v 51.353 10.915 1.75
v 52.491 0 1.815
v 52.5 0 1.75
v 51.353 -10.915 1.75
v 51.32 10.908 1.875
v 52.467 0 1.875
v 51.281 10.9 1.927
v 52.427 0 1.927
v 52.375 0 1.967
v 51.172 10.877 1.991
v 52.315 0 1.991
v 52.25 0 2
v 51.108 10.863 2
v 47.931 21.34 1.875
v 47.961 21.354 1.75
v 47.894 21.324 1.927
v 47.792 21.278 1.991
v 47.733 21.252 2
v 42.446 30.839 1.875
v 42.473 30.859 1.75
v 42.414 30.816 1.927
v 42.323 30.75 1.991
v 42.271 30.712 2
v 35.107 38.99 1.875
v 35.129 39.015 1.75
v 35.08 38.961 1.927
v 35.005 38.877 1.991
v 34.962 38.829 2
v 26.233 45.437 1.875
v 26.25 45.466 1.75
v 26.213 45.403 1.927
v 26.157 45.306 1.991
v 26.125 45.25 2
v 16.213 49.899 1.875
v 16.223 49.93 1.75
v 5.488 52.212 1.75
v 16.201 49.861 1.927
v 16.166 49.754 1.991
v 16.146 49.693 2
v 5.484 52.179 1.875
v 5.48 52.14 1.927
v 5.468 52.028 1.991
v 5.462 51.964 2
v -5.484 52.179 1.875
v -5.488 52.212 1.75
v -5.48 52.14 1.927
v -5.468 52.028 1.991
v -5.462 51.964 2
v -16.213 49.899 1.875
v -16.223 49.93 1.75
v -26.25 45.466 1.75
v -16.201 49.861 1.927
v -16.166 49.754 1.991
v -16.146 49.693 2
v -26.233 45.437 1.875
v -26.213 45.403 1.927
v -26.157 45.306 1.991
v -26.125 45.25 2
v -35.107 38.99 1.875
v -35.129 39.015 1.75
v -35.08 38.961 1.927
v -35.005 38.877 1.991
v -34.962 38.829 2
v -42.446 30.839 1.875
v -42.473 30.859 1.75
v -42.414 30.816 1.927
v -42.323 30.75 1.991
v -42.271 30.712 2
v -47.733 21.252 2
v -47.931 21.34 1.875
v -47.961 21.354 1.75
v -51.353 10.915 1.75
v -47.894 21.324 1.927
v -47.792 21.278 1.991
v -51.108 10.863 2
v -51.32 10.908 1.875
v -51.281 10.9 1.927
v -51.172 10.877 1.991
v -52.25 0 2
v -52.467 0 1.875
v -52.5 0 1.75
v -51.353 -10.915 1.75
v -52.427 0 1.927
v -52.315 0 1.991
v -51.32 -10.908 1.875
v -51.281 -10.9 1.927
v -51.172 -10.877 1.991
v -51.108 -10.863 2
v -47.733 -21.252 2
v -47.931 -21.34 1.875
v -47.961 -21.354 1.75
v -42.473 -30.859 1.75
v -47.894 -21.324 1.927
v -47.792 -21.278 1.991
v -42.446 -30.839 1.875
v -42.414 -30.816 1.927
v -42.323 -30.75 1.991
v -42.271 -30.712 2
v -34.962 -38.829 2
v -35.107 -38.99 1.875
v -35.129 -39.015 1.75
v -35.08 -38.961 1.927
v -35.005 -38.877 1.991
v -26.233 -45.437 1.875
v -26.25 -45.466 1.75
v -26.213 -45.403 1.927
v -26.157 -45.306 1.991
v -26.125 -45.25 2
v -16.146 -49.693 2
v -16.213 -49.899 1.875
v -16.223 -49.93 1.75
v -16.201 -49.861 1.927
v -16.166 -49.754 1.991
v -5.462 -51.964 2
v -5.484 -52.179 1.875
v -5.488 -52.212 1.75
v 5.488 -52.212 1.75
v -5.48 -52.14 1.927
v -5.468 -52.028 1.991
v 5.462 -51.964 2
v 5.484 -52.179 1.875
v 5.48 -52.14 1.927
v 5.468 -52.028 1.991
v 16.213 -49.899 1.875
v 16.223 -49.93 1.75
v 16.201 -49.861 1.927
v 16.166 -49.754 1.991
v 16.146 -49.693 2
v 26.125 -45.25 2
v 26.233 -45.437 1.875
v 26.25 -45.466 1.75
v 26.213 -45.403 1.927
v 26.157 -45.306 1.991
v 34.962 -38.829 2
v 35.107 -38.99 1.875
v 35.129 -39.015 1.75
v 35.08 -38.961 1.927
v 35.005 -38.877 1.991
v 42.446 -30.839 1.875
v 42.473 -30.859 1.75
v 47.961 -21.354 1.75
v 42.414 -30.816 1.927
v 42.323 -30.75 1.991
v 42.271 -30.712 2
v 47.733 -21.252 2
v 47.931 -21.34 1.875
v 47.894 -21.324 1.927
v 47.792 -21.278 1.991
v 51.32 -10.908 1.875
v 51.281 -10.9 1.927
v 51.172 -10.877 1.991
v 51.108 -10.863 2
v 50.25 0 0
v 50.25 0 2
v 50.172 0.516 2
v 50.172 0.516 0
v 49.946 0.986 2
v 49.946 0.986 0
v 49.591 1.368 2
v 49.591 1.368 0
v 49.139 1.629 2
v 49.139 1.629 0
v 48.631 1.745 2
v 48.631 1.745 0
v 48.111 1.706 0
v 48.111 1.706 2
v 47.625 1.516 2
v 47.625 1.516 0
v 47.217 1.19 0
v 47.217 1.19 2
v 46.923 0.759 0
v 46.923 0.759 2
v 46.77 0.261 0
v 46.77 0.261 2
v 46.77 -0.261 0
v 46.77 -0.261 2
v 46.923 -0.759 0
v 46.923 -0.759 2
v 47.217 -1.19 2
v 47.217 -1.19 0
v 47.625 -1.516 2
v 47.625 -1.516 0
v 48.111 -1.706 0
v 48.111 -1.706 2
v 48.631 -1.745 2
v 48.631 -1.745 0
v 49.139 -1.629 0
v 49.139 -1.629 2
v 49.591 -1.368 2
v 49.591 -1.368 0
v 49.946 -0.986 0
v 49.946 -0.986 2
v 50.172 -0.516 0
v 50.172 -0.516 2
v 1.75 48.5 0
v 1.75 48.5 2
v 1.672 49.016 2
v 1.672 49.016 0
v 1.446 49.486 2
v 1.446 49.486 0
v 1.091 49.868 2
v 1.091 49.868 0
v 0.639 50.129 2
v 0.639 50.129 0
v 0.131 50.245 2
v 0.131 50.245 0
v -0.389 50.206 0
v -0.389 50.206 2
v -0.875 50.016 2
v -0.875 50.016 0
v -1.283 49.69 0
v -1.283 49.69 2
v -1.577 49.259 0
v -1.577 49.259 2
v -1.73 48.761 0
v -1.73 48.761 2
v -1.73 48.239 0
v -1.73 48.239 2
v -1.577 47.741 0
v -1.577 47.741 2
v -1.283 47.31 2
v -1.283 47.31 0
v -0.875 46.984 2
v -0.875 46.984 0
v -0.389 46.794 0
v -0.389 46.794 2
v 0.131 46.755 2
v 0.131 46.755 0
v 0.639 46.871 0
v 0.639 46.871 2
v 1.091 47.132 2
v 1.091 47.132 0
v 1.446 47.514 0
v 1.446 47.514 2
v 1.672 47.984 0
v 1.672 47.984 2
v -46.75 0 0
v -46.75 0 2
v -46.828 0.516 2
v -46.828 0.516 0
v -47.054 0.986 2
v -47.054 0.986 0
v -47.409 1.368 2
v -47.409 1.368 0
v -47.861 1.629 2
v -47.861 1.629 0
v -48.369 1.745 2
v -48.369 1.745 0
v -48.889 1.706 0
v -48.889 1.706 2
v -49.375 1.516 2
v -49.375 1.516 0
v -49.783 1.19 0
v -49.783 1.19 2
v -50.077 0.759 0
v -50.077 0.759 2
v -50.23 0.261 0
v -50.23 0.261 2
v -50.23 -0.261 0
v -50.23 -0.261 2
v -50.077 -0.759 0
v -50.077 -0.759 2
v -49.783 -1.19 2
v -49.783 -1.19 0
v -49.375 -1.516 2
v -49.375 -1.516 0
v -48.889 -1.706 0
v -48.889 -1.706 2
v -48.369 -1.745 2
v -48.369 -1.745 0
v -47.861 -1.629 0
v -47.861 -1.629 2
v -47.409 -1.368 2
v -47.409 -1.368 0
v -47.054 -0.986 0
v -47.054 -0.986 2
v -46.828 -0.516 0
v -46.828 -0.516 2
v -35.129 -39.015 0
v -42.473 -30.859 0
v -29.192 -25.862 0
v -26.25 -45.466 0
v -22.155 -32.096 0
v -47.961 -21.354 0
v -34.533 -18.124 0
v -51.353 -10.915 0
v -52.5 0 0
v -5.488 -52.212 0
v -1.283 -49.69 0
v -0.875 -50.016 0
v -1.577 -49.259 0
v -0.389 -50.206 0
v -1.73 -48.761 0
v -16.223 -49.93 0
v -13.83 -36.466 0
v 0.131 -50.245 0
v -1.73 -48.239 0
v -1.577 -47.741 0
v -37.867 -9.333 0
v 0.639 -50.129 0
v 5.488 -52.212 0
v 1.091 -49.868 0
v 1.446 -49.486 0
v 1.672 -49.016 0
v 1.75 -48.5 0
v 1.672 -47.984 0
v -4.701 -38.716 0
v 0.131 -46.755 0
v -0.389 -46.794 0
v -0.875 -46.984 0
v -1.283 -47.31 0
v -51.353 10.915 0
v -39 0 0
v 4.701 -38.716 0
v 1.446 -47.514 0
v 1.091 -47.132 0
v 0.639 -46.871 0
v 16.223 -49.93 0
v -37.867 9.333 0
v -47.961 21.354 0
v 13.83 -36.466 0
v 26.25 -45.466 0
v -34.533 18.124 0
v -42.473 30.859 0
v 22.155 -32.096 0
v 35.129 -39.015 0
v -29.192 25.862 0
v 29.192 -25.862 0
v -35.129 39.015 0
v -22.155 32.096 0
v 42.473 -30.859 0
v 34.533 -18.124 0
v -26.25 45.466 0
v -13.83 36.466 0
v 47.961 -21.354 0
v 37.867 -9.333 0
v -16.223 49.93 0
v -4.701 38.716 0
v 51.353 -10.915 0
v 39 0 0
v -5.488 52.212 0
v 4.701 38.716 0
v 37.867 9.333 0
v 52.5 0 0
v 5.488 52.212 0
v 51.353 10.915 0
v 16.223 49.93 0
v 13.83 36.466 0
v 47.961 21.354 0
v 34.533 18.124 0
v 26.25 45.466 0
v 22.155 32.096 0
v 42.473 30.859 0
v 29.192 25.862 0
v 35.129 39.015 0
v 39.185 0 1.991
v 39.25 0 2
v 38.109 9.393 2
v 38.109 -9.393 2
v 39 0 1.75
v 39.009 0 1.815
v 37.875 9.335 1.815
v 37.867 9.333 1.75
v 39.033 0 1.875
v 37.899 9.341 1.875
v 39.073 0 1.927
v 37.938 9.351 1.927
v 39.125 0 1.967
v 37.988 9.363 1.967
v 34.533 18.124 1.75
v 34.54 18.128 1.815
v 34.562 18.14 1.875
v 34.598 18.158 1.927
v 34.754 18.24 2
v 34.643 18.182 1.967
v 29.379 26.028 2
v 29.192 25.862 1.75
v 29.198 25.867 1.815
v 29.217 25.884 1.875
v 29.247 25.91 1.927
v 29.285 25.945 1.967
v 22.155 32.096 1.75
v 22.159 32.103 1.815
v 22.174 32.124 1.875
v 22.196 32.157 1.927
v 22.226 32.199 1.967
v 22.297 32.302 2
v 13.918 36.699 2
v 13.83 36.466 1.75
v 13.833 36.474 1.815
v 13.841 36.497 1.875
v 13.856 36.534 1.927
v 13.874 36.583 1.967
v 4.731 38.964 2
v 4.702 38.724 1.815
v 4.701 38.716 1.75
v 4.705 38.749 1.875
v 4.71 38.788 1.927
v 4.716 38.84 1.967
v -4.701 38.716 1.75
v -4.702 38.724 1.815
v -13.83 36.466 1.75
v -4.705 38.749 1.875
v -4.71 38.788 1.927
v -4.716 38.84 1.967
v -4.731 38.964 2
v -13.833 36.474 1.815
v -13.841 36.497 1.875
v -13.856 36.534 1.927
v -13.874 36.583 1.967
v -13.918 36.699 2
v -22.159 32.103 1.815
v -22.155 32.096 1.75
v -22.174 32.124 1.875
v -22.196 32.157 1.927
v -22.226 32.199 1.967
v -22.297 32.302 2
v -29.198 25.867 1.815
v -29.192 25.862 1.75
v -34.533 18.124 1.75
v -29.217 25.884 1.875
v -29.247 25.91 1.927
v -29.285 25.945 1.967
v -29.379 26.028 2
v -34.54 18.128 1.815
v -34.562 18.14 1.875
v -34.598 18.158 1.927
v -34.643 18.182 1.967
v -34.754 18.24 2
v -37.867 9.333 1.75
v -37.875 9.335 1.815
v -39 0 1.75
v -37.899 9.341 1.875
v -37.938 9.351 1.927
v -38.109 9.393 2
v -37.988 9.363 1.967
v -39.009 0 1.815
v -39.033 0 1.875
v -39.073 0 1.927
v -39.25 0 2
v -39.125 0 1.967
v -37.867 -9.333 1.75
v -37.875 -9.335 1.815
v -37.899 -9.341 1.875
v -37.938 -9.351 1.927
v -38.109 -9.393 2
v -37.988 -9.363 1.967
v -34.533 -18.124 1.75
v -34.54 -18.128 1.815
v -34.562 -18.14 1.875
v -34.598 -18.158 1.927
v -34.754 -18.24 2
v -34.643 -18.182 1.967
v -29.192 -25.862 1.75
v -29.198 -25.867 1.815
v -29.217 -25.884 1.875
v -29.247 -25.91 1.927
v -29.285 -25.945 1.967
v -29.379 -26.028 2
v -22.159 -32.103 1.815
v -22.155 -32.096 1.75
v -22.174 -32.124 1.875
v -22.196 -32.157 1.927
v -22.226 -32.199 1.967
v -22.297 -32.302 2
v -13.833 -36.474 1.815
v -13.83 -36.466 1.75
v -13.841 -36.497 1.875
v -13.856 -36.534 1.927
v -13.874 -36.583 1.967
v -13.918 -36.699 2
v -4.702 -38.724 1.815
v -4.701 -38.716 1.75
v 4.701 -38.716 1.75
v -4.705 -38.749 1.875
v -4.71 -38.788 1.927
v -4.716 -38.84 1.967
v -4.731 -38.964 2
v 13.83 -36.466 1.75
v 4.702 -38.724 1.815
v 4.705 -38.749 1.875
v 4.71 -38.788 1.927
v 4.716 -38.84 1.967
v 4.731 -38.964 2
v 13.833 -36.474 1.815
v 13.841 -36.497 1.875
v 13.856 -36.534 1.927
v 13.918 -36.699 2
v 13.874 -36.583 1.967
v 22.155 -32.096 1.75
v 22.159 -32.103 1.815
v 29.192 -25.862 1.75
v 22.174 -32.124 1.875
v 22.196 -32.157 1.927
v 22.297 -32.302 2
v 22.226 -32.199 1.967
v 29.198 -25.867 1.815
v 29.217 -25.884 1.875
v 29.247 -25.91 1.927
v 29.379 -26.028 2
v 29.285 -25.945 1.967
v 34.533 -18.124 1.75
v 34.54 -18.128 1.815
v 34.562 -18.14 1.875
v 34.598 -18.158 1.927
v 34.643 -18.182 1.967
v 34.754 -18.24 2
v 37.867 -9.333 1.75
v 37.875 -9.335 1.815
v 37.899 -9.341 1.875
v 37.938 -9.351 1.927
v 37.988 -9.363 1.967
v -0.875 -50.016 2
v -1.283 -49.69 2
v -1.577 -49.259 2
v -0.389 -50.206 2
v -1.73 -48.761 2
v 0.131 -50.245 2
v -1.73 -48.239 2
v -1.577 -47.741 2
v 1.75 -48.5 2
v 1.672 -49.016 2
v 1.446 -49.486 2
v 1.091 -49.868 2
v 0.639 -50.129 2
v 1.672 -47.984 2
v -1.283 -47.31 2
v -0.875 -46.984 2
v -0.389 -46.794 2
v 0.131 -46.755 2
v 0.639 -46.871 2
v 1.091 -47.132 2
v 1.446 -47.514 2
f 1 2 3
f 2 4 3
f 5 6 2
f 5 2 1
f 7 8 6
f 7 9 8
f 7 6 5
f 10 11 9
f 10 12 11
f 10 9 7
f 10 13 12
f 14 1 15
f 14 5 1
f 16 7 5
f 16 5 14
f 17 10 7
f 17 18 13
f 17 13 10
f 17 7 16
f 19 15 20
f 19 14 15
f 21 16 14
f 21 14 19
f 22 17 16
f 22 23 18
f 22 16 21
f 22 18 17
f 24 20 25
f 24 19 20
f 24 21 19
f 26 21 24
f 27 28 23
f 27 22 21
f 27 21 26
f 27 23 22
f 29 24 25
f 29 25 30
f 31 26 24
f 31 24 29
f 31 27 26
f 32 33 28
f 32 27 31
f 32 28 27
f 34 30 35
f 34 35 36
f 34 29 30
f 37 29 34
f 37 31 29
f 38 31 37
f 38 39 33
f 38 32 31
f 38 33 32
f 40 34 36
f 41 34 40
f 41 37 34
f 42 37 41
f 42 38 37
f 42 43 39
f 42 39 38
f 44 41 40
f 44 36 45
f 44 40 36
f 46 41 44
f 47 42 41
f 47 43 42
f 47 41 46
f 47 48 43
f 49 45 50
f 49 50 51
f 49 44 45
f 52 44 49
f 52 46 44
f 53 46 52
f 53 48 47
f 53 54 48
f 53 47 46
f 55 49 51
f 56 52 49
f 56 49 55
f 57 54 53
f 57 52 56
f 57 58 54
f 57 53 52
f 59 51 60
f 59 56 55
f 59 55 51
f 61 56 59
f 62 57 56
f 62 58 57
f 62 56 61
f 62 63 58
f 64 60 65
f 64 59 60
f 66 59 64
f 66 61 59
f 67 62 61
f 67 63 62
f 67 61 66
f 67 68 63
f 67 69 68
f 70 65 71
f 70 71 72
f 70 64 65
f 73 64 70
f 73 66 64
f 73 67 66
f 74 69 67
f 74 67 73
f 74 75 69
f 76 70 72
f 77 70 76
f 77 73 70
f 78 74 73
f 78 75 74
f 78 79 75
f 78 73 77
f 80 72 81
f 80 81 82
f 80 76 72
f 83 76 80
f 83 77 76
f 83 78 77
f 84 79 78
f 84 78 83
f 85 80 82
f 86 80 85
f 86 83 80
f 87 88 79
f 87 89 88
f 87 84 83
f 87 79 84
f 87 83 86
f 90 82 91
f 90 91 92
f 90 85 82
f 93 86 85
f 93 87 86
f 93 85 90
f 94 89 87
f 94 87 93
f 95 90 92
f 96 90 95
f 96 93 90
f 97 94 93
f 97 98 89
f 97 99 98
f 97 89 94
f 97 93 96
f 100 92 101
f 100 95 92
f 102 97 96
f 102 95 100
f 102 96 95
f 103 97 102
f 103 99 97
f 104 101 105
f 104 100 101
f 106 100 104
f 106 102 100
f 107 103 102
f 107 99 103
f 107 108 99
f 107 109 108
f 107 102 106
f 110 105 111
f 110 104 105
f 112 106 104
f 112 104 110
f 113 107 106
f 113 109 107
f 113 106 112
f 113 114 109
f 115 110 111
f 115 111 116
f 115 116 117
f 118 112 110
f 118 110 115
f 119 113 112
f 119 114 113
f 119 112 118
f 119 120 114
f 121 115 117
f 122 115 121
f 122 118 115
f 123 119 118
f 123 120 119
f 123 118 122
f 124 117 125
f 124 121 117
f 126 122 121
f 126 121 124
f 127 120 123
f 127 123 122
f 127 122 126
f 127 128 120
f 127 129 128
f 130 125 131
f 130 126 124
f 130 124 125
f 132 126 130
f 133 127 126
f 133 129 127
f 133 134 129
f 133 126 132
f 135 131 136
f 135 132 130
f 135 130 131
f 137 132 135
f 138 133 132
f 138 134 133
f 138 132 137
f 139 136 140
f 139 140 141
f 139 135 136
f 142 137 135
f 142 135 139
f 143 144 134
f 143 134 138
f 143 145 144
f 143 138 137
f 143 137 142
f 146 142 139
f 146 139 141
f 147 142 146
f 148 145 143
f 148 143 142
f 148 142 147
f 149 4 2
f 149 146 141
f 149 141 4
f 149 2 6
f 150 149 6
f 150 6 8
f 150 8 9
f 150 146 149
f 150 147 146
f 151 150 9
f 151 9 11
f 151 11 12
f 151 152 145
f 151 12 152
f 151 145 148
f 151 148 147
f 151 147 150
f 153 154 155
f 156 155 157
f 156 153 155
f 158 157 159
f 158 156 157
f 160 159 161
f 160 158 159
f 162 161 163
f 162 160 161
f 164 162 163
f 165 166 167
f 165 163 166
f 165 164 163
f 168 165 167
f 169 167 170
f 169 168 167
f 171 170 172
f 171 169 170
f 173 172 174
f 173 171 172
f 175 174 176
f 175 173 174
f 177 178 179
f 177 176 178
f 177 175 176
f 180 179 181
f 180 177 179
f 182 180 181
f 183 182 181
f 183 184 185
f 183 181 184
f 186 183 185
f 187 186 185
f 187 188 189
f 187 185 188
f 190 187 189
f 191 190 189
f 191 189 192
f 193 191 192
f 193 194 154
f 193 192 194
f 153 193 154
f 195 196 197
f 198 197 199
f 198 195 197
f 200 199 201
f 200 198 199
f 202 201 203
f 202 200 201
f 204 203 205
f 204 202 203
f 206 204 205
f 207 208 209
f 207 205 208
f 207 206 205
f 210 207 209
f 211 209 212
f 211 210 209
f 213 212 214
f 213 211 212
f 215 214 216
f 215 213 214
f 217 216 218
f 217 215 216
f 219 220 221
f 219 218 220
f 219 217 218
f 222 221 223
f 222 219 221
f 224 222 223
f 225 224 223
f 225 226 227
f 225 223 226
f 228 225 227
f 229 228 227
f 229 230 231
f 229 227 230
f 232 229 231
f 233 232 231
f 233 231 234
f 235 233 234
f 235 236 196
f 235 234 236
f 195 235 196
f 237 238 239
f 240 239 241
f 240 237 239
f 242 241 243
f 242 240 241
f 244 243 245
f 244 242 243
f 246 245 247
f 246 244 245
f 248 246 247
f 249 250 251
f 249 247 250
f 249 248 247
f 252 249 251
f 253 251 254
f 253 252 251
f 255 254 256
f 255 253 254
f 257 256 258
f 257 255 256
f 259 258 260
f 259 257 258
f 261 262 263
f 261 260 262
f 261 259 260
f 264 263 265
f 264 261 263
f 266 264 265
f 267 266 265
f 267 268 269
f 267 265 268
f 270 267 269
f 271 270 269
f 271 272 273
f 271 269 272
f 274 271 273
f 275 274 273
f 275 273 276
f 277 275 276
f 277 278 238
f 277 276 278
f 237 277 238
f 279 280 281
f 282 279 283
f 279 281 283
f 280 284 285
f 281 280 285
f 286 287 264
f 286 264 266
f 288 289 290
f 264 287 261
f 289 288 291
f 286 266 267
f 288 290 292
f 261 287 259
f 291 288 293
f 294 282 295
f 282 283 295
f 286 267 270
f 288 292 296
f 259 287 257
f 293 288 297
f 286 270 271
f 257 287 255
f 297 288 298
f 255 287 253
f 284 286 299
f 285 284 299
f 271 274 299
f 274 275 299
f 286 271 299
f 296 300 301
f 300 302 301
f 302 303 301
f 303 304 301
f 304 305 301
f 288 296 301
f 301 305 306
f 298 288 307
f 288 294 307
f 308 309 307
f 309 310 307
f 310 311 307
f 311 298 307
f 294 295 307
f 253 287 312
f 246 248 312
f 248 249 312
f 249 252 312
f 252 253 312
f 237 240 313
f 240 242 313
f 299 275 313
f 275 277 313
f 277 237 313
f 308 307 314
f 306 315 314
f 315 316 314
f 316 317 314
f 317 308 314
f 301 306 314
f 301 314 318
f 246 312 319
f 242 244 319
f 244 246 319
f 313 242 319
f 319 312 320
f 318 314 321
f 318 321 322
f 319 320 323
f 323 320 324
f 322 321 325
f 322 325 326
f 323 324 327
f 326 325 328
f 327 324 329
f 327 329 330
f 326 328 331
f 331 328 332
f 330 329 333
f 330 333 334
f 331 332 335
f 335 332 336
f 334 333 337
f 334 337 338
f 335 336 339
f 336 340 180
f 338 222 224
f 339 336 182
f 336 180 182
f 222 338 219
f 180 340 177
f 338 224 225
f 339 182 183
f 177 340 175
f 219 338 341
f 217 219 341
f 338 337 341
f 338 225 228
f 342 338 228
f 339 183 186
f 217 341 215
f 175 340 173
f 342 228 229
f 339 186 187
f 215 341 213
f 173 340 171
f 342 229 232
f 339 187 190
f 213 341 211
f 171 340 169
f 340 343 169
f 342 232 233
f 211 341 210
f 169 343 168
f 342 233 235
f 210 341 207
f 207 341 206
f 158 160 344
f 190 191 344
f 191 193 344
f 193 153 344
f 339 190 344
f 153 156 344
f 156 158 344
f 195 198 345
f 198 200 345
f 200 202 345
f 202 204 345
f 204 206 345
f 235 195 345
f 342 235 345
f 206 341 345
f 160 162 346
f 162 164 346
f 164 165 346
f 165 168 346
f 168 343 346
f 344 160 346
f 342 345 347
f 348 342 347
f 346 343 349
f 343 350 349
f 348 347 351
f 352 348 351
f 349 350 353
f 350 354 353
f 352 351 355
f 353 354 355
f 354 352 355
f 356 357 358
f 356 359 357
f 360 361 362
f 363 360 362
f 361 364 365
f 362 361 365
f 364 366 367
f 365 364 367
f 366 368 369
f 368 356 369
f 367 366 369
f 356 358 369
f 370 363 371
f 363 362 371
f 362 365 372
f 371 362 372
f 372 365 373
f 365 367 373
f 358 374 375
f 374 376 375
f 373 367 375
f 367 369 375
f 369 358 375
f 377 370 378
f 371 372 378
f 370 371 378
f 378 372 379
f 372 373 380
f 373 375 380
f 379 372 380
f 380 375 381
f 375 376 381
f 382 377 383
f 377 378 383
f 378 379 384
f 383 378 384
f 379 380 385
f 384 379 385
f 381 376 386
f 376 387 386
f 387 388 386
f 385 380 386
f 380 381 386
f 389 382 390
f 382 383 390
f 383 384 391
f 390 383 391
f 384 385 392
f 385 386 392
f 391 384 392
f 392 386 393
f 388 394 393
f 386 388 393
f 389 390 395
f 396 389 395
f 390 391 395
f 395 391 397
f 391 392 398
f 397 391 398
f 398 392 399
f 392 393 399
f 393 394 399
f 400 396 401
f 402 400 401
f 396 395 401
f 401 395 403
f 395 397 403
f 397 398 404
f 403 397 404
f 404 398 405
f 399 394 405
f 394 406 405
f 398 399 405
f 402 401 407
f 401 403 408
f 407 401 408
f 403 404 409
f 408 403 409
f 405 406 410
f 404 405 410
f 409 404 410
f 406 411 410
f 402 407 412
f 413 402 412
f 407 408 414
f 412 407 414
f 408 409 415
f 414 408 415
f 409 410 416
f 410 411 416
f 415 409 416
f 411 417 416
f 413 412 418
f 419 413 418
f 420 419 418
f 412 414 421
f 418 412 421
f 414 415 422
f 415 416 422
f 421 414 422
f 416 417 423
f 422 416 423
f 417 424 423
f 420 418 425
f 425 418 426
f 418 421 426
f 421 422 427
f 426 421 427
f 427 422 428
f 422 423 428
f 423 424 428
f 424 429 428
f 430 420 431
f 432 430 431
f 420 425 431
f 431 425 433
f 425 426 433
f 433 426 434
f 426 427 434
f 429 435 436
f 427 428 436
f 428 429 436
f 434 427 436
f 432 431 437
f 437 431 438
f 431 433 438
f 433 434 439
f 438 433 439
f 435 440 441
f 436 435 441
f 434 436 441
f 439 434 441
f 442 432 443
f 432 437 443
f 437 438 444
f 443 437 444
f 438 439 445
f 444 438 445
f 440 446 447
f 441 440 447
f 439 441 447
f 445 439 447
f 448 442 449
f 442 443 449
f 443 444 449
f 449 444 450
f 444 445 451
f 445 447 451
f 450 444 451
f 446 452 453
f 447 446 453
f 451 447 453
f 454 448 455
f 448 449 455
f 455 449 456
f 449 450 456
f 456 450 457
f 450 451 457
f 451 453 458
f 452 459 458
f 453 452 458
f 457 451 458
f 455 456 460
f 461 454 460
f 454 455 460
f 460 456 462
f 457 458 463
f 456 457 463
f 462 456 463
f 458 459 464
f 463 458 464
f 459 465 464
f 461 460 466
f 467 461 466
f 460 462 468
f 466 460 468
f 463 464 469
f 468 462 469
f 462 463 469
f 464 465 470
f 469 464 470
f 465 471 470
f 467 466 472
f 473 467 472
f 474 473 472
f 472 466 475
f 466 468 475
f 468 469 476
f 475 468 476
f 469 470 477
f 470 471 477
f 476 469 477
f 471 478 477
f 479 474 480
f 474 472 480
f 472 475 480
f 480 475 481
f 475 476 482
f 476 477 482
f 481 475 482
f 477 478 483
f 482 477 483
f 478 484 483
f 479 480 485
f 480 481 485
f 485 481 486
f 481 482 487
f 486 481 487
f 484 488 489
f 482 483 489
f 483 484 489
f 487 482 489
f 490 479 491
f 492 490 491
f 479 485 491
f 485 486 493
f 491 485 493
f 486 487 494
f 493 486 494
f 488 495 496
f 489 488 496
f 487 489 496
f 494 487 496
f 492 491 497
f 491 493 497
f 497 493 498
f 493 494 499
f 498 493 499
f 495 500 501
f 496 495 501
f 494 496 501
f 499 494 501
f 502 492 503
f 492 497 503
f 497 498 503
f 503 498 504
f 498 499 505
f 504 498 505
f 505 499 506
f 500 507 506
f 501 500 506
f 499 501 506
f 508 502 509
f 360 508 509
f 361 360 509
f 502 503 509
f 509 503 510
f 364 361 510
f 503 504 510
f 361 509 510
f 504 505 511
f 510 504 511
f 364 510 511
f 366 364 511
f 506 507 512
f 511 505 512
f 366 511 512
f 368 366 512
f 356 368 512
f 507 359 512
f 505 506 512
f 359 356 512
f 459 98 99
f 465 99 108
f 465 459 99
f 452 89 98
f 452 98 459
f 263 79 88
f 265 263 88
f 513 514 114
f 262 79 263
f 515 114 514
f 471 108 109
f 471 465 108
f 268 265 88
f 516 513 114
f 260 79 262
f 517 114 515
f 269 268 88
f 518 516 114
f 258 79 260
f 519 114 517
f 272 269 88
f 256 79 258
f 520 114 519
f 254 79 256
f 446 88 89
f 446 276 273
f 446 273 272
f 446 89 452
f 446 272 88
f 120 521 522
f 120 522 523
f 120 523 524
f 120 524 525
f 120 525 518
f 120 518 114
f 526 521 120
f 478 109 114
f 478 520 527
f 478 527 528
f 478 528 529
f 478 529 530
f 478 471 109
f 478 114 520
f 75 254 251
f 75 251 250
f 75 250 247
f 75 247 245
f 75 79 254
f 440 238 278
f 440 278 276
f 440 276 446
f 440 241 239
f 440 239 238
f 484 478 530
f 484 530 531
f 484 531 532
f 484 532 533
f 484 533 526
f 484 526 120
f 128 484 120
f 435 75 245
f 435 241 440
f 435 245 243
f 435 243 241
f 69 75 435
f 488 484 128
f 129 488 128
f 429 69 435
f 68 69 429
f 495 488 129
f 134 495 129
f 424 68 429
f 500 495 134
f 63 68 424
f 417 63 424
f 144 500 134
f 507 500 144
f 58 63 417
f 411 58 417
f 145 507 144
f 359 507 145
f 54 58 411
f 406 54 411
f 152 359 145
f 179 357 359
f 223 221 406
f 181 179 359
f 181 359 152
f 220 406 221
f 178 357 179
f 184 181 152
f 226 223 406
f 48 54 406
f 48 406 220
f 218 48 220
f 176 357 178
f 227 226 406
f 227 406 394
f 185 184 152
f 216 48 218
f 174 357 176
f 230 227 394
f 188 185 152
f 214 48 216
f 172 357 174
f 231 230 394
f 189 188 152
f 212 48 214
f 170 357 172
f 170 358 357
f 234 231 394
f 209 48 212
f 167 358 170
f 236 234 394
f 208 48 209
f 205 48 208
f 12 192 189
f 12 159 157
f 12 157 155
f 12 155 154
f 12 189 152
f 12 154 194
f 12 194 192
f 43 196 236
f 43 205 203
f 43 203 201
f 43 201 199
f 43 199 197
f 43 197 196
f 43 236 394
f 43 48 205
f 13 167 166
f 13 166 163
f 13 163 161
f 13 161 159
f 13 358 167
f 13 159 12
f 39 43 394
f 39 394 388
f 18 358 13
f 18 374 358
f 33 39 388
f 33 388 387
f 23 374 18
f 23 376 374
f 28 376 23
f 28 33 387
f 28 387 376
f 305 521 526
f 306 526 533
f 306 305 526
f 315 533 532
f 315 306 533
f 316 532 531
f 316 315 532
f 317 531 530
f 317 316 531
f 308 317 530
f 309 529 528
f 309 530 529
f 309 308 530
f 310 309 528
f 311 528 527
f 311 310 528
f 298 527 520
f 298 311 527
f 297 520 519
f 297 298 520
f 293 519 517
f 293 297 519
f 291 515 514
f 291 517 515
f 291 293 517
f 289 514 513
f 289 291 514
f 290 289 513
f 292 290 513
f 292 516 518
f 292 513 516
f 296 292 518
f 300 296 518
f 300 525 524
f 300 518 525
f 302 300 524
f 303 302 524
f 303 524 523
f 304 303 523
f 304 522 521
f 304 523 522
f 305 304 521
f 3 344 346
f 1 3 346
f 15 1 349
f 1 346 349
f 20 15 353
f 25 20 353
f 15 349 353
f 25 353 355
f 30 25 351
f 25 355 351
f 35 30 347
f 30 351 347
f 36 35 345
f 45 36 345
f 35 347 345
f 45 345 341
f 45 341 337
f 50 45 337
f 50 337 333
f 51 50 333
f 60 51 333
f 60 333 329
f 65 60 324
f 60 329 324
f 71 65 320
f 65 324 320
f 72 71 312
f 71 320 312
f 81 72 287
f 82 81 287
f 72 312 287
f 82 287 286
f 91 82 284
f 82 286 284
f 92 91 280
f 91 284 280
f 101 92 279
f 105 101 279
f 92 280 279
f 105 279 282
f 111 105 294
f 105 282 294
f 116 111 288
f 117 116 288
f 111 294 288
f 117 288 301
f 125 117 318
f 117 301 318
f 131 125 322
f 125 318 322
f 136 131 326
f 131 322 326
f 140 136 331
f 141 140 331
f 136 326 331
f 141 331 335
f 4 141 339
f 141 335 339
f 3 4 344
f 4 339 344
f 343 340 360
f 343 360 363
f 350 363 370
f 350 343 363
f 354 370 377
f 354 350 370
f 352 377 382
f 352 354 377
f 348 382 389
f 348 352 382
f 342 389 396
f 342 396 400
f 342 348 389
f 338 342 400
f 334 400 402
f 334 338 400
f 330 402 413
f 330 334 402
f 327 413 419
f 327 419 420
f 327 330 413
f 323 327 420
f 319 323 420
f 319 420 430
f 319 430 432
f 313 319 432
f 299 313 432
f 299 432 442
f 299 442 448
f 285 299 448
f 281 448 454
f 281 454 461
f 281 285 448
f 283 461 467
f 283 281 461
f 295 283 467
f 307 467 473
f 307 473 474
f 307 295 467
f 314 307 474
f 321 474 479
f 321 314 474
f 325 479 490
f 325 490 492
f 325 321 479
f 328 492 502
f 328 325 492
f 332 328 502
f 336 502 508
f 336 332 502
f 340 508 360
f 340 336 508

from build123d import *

# Parameters (mm, degrees)
F0_R     = 52.5
F0_R_2   = 39
F1_DEPTH = 2
F2_R     = 0.25
F3_R     = 1.75
F4_DEPTH = 2.001


with BuildPart() as f1:
    # F0 (on Top) → F1 (new body)
    with BuildSketch(Plane.XY):
        Circle(F0_R)
        Circle(F0_R_2, mode=Mode.SUBTRACT)
    extrude(amount=F1_DEPTH)

    # F2
    f2_edges = [f1.edges().sort_by_distance(p)[0] for p in [
        (-52.5, 0, 2),
        (-39, 0, 2),
    ]]
    fillet(f2_edges, radius=F2_R)

    # F3 (on Top) → F4 (cut, through all)
    with BuildSketch(Plane.XY):
        with Locations((48.5, 0)):
            Circle(F3_R)
        with Locations((0, 48.5)):
            Circle(F3_R)
        with Locations((-48.5, 0)):
            Circle(F3_R)
        with Locations((0, -48.5)):
            Circle(F3_R)
    extrude(amount=F4_DEPTH, mode=Mode.SUBTRACT)


solid = f1.part
